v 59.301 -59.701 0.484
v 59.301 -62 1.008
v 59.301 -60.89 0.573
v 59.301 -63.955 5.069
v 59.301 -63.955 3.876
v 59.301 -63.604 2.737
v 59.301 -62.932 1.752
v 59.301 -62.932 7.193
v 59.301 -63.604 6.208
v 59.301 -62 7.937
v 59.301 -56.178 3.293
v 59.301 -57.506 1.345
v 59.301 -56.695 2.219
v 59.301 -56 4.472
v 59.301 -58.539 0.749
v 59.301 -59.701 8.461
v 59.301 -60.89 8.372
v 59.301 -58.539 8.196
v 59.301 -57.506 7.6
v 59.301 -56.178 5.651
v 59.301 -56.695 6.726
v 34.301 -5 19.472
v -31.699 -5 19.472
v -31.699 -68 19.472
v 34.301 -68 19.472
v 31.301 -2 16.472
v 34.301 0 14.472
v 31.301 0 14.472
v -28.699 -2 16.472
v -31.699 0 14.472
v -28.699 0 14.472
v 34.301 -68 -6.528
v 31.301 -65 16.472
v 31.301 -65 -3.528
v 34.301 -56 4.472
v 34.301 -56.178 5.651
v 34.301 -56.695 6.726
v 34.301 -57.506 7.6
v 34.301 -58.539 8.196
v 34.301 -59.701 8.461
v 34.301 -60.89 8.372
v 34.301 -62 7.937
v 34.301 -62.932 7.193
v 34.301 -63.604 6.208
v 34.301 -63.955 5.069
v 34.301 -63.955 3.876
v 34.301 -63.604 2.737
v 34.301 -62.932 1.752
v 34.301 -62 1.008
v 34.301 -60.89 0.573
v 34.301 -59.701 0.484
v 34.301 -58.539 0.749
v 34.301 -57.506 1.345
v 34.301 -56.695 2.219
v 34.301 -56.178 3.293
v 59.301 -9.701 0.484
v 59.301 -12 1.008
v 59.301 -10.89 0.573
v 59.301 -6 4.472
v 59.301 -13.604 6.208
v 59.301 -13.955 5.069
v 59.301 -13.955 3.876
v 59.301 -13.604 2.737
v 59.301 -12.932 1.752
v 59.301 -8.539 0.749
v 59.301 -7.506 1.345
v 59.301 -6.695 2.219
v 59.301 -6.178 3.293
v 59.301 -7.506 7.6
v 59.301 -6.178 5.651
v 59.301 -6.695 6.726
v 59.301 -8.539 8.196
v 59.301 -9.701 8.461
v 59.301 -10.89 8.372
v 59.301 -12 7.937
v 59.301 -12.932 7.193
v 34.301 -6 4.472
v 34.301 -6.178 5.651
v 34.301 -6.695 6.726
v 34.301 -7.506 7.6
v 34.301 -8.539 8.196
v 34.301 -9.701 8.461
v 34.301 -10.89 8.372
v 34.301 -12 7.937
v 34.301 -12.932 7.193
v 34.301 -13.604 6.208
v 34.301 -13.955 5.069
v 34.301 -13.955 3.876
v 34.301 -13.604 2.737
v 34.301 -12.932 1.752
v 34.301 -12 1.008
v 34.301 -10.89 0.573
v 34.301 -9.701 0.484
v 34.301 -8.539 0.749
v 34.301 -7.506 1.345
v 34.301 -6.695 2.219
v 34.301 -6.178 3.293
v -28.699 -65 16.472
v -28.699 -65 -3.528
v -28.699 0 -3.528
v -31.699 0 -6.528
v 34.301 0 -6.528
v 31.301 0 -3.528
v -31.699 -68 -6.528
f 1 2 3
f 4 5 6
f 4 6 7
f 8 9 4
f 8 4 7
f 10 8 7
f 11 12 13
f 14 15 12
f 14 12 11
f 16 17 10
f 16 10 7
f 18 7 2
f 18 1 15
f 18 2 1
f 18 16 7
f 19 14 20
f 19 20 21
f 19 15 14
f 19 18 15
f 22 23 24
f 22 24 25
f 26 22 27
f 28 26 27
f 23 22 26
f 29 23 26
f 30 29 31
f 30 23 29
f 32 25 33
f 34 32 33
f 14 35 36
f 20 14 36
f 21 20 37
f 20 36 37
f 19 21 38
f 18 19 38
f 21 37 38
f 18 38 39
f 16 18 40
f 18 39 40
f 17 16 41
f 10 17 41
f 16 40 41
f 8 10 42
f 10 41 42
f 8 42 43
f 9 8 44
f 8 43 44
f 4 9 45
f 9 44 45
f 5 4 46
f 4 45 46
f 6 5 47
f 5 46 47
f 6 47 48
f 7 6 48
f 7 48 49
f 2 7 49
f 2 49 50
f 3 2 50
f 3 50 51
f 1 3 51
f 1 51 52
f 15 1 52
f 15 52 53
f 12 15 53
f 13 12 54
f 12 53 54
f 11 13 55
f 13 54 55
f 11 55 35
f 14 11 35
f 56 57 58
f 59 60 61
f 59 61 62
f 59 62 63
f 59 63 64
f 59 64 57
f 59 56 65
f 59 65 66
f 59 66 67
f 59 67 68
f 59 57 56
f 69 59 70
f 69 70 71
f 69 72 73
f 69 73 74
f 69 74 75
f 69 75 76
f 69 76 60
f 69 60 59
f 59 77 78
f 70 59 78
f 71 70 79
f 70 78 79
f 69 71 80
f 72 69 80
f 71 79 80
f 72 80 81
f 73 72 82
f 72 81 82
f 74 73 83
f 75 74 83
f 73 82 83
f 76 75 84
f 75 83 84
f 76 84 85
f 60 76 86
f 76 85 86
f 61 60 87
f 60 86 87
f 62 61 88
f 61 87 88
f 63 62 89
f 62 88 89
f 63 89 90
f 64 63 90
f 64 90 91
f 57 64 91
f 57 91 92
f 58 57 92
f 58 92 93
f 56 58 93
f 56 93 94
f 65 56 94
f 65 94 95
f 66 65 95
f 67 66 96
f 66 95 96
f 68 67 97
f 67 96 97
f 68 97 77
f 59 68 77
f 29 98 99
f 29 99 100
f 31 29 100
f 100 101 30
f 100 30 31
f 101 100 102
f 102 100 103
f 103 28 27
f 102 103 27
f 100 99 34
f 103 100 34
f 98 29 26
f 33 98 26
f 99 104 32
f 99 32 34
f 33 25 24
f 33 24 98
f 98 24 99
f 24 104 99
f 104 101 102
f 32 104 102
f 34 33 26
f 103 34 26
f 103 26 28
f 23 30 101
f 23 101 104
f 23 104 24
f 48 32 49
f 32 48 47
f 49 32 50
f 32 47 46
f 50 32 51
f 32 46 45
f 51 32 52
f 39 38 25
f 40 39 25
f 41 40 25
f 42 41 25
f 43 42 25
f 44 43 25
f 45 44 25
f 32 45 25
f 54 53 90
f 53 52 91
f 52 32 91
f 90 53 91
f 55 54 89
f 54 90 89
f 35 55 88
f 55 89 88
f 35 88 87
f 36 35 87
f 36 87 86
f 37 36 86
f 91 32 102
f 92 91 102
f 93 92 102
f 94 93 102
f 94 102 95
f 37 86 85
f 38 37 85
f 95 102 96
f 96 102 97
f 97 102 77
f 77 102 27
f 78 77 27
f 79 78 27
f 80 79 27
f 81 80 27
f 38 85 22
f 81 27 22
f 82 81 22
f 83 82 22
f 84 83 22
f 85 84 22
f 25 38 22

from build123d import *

# Parameters (mm, degrees)
F0_W         = 66
F0_H         = 26
F0_W_2       = 60
F0_H_2       = 20
F1_DEPTH     = 70
F2_R         = 4
F3_DEPTH     = 25
F4_T1_DEPTH  = 60
F4_T3_DEPTH  = 20
F4_T9_DEPTH  = 72.8584149398
F4_T15_DEPTH = 32.8584149398
F4_T24_DEPTH = 72.8584149398
F4_T30_DEPTH = 32.8584149398
F4_T39_DEPTH = 72.8584149398
F4_T45_DEPTH = 32.8584149398
F4_T54_DEPTH = 32.8584149398
F4_T60_DEPTH = 72.8584149398
F5_T1_DEPTH  = 91.7168298797


# Not quite as in the source:
# - a fillet or chamfer that OpenCascade refuses, or shapes differently, is made with other operations: its cross-section is extruded or revolved along the edge and cut away or added


with BuildPart() as f1:
    # F0 (on Front) → F1 (new body)
    with BuildSketch(Plane.XZ):
        with Locations((1.3007868016, 6.4724322181)):
            Rectangle(F0_W, F0_H)
        with Locations((1.3007868016, 6.4724322181)):
            Rectangle(F0_W_2, F0_H_2, mode=Mode.SUBTRACT)
    extrude(amount=F1_DEPTH)

    # F2 (on face) → F3 (join)
    with BuildSketch(Plane.YZ.offset(34.3007868016)):
        with Locations((-60, 4.4724322181)):
            Circle(F2_R)
        with Locations((-10, 4.4724322181)):
            Circle(F2_R)
    extrude(amount=F3_DEPTH)

    # F4: chamfer of 5 on 4 edges, made by hand

    # F4_s2 → F4_t1 (cut)
    with BuildSketch(Plane.YZ.offset(-28.6992131984)):
        Polygon((-70, 21.4724322181), (-65, 16.4724322181), (-70, 16.4724322181), align=None)
        Polygon((-70, -8.5275677819), (-65, -3.5275677819), (-70, -3.5275677819), align=None)
    extrude(amount=F4_T1_DEPTH, mode=Mode.SUBTRACT)

    # F4_s4 → F4_t3 (cut)
    with BuildSketch(Plane.XY.offset(-3.5275677819)):
        Polygon((-33.6992131984, -70), (-28.6992131984, -65), (-28.6992131984, -70), align=None)
        Polygon((36.3007868016, -70), (31.3007868016, -65), (31.3007868016, -70), align=None)
    extrude(amount=F4_T3_DEPTH, mode=Mode.SUBTRACT)


with BuildPart() as f4_tool7:
    # F4_s8 → F4_t9 (new body)
    with BuildSketch(Plane.YZ.offset(-41.5576281383)):
        Polygon((-70, 21.4724322181), (-65, 16.4724322181), (-70, 16.4724322181), align=None)
    extrude(amount=F4_T9_DEPTH)

    split(bisect_by=Plane.YZ.offset(-31.6992131984), keep=Keep.TOP)

    split(bisect_by=Plane.XY.offset(19.4724322181), keep=Keep.BOTTOM)

    split(bisect_by=Plane.YZ.offset(-28.6992131984), keep=Keep.BOTTOM)


with BuildPart() as f4_tool13:
    # F4_s14 → F4_t15 (new body)
    with BuildSketch(Plane.XY.offset(-3.5275677819)):
        Polygon((-33.6992131984, -70), (-28.6992131984, -65), (-28.6992131984, -70), align=None)
    extrude(amount=F4_T15_DEPTH)

    split(bisect_by=Plane.YZ.offset(-31.6992131984), keep=Keep.TOP)

    split(bisect_by=Plane.XY.offset(19.4724322181), keep=Keep.BOTTOM)

    split(bisect_by=Plane.XY.offset(16.4724322181), keep=Keep.TOP)


with BuildPart() as f4_tool7_1:
    add(f4_tool7.part)

    # F4_t19: intersect F4_tool13
    add(f4_tool13.part, mode=Mode.INTERSECT)


with BuildPart() as f1_1:
    add(f1.part)

    # F4_t5: cut F4_tool7
    add(f4_tool7_1.part, mode=Mode.SUBTRACT)


with BuildPart() as f4_tool22:
    # F4_s23 → F4_t24 (new body)
    with BuildSketch(Plane.YZ.offset(-28.6992131984)):
        Polygon((-70, 21.4724322181), (-65, 16.4724322181), (-70, 16.4724322181), align=None)
    extrude(amount=F4_T24_DEPTH)

    split(bisect_by=Plane.YZ.offset(34.3007868016), keep=Keep.BOTTOM)

    split(bisect_by=Plane.XY.offset(19.4724322181), keep=Keep.BOTTOM)

    split(bisect_by=Plane.YZ.offset(31.3007868016), keep=Keep.TOP)


with BuildPart() as f4_tool28:
    # F4_s29 → F4_t30 (new body)
    with BuildSketch(Plane.XY.offset(29.3308471579)):
        Polygon((36.3007868016, -70), (31.3007868016, -65), (31.3007868016, -70), align=None)
    extrude(amount=-F4_T30_DEPTH)

    split(bisect_by=Plane.YZ.offset(34.3007868016), keep=Keep.BOTTOM)

    split(bisect_by=Plane.XY.offset(19.4724322181), keep=Keep.BOTTOM)

    split(bisect_by=Plane.XY.offset(16.4724322181), keep=Keep.TOP)


with BuildPart() as f4_tool22_1:
    add(f4_tool22.part)

    # F4_t34: intersect F4_tool28
    add(f4_tool28.part, mode=Mode.INTERSECT)


with BuildPart() as f1_2:
    add(f1_1.part)

    # F4_t20: cut F4_tool22
    add(f4_tool22_1.part, mode=Mode.SUBTRACT)


with BuildPart() as f4_tool37:
    # F4_s38 → F4_t39 (new body)
    with BuildSketch(Plane.YZ.offset(31.3007868016)):
        Polygon((-70, -8.5275677819), (-65, -3.5275677819), (-70, -3.5275677819), align=None)
    extrude(amount=-F4_T39_DEPTH)

    split(bisect_by=Plane.XY.offset(-6.5275677819), keep=Keep.TOP)

    split(bisect_by=Plane.YZ.offset(-31.6992131984), keep=Keep.TOP)

    split(bisect_by=Plane.YZ.offset(-28.6992131984), keep=Keep.BOTTOM)


with BuildPart() as f4_tool43:
    # F4_s44 → F4_t45 (new body)
    with BuildSketch(Plane.XY.offset(-16.3859827218)):
        Polygon((-33.6992131984, -70), (-28.6992131984, -65), (-28.6992131984, -70), align=None)
    extrude(amount=F4_T45_DEPTH)

    split(bisect_by=Plane.XY.offset(-6.5275677819), keep=Keep.TOP)

    split(bisect_by=Plane.YZ.offset(-31.6992131984), keep=Keep.TOP)

    split(bisect_by=Plane.XY.offset(-3.5275677819), keep=Keep.BOTTOM)


with BuildPart() as f4_tool37_1:
    add(f4_tool37.part)

    # F4_t49: intersect F4_tool43
    add(f4_tool43.part, mode=Mode.INTERSECT)


with BuildPart() as f1_3:
    add(f1_2.part)

    # F4_t35: cut F4_tool37
    add(f4_tool37_1.part, mode=Mode.SUBTRACT)


with BuildPart() as f4_tool52:
    # F4_s53 → F4_t54 (new body)
    with BuildSketch(Plane.XY.offset(16.4724322181)):
        Polygon((36.3007868016, -70), (31.3007868016, -65), (31.3007868016, -70), align=None)
    extrude(amount=-F4_T54_DEPTH)

    split(bisect_by=Plane.XY.offset(-6.5275677819), keep=Keep.TOP)

    split(bisect_by=Plane.YZ.offset(34.3007868016), keep=Keep.BOTTOM)

    split(bisect_by=Plane.XY.offset(-3.5275677819), keep=Keep.BOTTOM)


with BuildPart() as f4_tool58:
    # F4_s59 → F4_t60 (new body)
    with BuildSketch(Plane.YZ.offset(44.1592017414)):
        Polygon((-70, -8.5275677819), (-65, -3.5275677819), (-70, -3.5275677819), align=None)
    extrude(amount=-F4_T60_DEPTH)

    split(bisect_by=Plane.XY.offset(-6.5275677819), keep=Keep.TOP)

    split(bisect_by=Plane.YZ.offset(34.3007868016), keep=Keep.BOTTOM)

    split(bisect_by=Plane.YZ.offset(31.3007868016), keep=Keep.TOP)


with BuildPart() as f4_tool52_1:
    add(f4_tool52.part)

    # F4_t64: intersect F4_tool58
    add(f4_tool58.part, mode=Mode.INTERSECT)


with BuildPart() as f1_4:
    add(f1_3.part)

    # F4_t50: cut F4_tool52
    add(f4_tool52_1.part, mode=Mode.SUBTRACT)

    # F5: chamfer of 5 on 1 edges, made by hand

    # F5_s2 → F5_t1 (cut)
    with BuildSketch(Plane.YZ.offset(-44.5576281383)):
        Polygon((-5, 19.4724322181), (0, 14.4724322181), (0, 19.4724322181), align=None)
    extrude(amount=F5_T1_DEPTH, mode=Mode.SUBTRACT)


solid = f1_4.part
